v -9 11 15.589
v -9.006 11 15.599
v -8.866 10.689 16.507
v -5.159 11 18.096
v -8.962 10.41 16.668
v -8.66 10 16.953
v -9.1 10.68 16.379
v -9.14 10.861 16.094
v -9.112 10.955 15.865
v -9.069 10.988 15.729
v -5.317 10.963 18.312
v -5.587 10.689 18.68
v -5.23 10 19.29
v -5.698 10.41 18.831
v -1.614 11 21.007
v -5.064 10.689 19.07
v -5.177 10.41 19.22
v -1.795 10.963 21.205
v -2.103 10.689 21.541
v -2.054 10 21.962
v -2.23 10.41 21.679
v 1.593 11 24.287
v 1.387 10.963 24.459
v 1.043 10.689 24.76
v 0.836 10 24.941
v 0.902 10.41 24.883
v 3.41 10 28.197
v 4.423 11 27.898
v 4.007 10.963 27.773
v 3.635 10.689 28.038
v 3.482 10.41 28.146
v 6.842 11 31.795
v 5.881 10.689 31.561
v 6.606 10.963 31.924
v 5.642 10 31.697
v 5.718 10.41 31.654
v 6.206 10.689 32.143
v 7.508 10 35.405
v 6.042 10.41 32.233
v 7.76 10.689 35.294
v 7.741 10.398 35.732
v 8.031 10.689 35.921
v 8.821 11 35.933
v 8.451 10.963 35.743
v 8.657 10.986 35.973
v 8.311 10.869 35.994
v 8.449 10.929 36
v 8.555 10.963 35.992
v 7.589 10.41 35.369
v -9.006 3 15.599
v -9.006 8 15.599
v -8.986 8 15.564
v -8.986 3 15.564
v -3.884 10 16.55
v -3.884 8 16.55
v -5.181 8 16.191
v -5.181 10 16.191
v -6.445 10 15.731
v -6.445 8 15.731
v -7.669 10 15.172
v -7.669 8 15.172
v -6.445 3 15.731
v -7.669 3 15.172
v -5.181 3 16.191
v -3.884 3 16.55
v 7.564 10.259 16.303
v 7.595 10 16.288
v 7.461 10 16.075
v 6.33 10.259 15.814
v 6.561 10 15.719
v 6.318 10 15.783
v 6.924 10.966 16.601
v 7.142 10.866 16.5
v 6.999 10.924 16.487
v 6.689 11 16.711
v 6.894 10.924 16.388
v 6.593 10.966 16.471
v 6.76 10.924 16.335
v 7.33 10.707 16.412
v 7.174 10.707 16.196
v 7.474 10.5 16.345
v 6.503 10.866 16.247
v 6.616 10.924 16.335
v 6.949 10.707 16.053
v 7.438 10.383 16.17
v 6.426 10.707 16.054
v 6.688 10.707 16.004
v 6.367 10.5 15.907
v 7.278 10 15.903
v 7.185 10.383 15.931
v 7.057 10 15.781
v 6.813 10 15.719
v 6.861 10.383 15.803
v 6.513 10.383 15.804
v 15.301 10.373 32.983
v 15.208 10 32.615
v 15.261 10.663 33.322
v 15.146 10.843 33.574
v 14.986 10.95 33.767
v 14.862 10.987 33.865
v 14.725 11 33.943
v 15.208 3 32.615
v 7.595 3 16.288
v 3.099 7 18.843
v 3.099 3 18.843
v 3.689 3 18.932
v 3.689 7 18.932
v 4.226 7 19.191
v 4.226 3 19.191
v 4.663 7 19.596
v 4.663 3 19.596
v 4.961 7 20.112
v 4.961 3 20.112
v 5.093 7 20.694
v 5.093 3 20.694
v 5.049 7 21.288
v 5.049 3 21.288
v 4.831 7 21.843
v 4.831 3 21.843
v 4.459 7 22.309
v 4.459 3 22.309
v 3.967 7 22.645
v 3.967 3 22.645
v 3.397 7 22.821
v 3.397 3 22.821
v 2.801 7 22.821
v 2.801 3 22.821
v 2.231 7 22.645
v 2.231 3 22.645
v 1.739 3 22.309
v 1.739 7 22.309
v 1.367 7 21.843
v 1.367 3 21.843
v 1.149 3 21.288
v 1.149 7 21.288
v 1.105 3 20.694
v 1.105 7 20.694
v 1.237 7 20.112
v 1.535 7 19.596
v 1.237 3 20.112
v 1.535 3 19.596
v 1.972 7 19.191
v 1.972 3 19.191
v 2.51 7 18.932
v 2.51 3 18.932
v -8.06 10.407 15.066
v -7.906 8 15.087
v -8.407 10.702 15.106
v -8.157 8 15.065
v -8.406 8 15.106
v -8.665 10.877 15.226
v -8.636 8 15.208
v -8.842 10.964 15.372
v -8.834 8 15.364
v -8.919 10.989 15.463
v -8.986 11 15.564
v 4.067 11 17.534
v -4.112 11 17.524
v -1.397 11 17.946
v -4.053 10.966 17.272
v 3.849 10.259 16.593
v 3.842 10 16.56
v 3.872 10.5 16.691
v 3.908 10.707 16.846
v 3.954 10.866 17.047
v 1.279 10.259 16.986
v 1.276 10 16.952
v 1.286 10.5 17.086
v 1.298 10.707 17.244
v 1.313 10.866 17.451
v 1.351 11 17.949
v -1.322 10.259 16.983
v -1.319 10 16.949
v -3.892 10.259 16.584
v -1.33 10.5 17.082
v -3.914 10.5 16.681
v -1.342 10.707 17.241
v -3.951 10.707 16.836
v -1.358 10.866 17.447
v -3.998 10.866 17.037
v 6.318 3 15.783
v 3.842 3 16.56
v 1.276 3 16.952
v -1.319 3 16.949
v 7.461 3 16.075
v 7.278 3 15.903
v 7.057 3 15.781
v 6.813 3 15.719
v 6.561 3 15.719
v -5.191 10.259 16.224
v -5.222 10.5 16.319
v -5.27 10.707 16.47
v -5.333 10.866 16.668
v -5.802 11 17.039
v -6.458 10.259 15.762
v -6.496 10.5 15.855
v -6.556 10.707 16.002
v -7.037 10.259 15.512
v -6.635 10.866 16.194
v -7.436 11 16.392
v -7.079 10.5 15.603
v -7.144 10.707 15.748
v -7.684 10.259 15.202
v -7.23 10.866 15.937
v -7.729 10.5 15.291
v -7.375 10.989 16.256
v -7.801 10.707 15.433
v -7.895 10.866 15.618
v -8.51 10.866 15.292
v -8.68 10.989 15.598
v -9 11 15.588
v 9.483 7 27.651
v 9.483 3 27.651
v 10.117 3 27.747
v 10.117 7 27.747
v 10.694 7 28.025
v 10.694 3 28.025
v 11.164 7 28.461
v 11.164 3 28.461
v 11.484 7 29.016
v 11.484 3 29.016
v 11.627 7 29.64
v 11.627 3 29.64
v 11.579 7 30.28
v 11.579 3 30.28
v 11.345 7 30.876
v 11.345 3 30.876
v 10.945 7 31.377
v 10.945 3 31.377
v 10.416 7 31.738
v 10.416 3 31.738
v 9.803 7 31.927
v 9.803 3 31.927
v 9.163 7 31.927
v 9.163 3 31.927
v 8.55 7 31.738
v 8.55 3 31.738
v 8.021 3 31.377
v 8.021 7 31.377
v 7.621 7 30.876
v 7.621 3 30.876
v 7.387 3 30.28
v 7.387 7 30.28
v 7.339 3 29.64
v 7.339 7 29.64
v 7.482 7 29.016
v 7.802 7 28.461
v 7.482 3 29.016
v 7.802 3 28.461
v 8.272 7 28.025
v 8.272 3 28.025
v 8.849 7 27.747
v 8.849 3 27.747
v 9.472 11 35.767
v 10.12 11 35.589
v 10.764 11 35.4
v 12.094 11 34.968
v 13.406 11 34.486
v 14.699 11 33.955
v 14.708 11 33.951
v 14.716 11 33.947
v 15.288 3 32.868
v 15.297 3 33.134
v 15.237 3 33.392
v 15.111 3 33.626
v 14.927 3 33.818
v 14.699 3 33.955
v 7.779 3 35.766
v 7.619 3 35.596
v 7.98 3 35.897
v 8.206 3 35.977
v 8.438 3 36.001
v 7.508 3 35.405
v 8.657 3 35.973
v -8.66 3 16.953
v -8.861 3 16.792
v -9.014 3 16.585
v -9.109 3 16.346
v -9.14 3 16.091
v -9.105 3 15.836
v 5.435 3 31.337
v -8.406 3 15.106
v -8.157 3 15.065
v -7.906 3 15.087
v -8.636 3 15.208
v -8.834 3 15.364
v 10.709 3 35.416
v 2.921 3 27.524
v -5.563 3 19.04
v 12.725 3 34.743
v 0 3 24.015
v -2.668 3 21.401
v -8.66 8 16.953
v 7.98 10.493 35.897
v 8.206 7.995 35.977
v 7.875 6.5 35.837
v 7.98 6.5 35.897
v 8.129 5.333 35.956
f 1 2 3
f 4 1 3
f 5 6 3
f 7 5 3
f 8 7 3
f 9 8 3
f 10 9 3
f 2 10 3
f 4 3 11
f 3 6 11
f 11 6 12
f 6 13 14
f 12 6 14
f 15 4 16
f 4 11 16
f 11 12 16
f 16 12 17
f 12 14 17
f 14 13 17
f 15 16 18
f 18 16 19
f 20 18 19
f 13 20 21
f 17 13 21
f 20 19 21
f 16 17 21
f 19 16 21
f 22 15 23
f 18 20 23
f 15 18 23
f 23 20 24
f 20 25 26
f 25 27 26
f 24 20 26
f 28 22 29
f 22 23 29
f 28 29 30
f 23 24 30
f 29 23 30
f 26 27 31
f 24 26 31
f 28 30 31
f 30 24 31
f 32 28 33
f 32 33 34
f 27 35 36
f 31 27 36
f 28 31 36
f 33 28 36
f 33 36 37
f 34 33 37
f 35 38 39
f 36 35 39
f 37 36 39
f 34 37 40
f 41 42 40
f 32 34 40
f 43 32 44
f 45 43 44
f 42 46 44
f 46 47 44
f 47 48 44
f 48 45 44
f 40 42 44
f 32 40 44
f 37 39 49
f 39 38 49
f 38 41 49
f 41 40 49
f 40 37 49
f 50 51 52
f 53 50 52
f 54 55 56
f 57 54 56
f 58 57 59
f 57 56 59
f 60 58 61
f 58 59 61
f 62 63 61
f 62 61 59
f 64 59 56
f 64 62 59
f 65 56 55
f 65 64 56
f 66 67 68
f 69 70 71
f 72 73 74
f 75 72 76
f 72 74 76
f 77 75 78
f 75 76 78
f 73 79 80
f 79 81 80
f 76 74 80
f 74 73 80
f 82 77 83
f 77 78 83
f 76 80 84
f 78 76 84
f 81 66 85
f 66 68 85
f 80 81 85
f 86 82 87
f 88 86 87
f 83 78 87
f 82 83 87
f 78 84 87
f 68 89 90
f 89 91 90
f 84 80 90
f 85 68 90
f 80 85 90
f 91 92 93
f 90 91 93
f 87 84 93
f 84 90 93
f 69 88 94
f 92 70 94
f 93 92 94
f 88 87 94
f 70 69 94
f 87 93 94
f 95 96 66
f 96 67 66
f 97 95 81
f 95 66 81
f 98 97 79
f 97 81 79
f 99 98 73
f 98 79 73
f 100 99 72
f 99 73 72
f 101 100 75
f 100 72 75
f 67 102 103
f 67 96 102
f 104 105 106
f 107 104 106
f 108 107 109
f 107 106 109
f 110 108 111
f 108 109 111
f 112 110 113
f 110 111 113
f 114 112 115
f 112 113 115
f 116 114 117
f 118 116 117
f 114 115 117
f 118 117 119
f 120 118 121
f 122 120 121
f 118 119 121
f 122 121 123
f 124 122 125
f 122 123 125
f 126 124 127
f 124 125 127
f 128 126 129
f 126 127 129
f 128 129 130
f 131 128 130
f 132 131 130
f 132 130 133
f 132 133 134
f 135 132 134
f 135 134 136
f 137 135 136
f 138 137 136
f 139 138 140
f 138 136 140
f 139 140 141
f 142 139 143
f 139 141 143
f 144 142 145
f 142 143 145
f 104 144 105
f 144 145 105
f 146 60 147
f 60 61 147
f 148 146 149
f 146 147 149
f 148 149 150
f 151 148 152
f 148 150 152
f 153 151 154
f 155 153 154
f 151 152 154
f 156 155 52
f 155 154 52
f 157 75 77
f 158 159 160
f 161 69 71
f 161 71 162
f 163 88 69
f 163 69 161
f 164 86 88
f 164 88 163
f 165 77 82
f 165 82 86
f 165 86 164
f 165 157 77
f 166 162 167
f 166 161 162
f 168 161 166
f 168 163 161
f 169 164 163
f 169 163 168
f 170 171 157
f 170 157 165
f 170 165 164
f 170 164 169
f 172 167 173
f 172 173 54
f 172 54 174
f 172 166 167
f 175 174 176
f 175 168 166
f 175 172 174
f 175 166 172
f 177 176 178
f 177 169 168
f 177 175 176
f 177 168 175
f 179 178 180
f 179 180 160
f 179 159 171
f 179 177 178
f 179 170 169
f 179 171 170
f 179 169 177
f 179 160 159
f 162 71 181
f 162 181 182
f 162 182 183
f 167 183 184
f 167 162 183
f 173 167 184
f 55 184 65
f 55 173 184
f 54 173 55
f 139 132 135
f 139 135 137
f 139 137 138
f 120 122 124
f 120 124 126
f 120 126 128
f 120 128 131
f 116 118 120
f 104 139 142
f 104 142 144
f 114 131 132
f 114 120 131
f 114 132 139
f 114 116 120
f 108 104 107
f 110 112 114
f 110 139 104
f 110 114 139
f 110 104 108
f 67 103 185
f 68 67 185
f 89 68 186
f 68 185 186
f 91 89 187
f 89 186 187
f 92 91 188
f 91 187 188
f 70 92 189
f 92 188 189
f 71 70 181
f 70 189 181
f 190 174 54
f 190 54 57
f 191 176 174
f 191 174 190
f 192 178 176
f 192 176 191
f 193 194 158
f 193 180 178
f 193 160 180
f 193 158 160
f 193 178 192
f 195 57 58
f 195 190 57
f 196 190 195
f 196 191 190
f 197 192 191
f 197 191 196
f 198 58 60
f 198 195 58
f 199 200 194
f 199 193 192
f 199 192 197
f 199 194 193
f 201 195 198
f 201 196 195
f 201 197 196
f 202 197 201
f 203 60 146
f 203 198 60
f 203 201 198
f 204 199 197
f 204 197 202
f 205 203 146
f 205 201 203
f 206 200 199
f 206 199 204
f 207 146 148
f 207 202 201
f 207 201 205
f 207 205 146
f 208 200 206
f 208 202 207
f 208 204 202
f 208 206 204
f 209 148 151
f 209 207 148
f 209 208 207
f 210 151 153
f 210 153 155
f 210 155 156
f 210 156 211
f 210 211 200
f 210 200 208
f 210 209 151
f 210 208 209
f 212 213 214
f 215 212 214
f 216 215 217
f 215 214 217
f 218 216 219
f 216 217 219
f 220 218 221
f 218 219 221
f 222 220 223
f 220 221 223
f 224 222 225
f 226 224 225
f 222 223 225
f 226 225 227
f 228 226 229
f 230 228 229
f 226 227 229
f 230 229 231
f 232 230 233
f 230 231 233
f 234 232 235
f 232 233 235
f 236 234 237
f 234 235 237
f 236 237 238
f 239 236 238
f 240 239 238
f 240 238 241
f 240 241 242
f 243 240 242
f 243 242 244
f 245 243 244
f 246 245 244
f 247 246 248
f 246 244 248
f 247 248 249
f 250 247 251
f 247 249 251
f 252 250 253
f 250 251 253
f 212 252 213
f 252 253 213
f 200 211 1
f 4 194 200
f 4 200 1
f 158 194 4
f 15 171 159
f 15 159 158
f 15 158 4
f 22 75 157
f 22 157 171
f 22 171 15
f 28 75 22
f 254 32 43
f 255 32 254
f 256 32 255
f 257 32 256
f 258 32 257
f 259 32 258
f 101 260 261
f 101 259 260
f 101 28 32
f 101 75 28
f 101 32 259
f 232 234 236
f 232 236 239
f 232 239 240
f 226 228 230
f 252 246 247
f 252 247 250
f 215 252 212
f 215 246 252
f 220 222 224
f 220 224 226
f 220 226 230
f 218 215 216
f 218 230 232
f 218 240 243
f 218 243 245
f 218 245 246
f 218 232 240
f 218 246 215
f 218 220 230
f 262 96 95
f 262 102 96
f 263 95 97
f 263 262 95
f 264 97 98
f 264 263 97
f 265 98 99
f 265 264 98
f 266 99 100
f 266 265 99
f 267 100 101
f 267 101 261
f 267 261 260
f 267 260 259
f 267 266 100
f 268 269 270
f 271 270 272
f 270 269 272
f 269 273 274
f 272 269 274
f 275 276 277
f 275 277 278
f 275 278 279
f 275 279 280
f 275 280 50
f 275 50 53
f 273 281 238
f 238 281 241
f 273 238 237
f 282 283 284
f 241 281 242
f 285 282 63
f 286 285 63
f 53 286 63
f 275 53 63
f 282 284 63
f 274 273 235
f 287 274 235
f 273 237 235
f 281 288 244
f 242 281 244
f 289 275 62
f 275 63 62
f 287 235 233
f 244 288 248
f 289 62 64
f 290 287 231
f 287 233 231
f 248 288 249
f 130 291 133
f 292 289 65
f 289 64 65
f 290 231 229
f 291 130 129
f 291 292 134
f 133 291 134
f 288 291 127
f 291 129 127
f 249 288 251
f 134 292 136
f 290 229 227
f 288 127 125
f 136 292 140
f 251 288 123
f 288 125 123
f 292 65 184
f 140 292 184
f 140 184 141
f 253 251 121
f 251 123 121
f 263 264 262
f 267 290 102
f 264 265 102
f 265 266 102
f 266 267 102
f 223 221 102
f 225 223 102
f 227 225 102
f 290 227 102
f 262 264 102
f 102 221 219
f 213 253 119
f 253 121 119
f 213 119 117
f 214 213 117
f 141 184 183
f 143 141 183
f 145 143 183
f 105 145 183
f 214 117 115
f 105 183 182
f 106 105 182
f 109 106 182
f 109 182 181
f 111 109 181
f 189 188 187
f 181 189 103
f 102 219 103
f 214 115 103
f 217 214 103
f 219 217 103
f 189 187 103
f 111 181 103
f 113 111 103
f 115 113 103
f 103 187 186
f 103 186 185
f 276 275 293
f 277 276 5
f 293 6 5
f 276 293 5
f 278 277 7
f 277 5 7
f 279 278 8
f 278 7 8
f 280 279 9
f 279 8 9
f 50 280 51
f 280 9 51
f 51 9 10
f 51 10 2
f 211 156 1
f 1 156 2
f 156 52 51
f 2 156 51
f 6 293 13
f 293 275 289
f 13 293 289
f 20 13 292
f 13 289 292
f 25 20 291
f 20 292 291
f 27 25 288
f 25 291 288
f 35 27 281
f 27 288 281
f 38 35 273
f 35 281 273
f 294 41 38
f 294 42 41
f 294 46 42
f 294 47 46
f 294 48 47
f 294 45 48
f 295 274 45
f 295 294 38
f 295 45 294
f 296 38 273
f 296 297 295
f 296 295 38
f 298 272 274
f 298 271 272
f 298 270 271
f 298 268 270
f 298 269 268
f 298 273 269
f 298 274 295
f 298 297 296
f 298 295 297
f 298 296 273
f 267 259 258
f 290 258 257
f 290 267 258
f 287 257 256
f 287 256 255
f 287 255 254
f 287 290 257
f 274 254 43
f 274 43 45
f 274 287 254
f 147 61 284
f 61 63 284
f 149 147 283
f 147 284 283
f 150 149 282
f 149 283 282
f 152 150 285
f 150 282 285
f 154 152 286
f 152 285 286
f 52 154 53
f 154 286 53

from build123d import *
from build123d.topology import SkipClean

# Parameters (mm, degrees)
SWEEP_2_DEPTH        = 3
SKETCH_15_W          = 3
SKETCH_15_H          = 8
SKETCH_17_W          = 3
SKETCH_17_H          = 8
REVOLVE_1_ANGLE      = 60
SKETCH_20_R          = 26.546275206
EXTRUDE_1_DEPTH      = 3
SKETCH_21_R          = 12.5
CUT_EXTRUDE_1_DEPTH  = 10
CUT_EXTRUDE_2_REACH  = 67.765
SKETCH_22_R          = 17
EXTRUDE_START        = 22
SKETCH_23_R          = 16.5
SKETCH_23_R_2        = 12.5
EXTRUDE_2_DEPTH      = 22
SKETCH_24_R          = 70.041464106
CUT_EXTRUDE_3_DEPTH  = 10
SKETCH_27_R          = 3
EXTRUDE_4_DEPTH      = 5
SKETCH_28_R          = 1.4
CUT_EXTRUDE_4_DEPTH  = 66.76473219
EXTRUDE_5_DEPTH      = 15
EXTRUDE_5_DEPTH_BACK = 3
SKETCH_30_R          = 1.4
EXTRUDE_6_DEPTH      = 3
EXTRUDE_9_DEPTH      = 8
SKETCH_34_R          = 1.5
CUT_EXTRUDE_5_DEPTH  = 13
SKETCH_35_R          = 57
SKETCH_35_R_2        = 37
CUT_EXTRUDE_6_DEPTH  = 69.556546004
FILLET_1_R           = 1
SKETCH_36_R          = 1.5
EXTRUDE_10_DEPTH     = 4
SKETCH_37_R          = 2
SKETCH_37_R_2        = 2.15
CUT_EXTRUDE_7_DEPTH  = 4


# Read off the part's stored shape, not the designer's step: 扫描2
with BuildPart() as part:
    # 扫描2 outline → 扫描2 (new body)
    with BuildSketch(Plane(origin=(0, 0, 0), x_dir=(1, 0, 0), z_dir=(0, 1, 0))):
        with BuildLine():
            ThreePointArc((-20, -34.641016151), (-12.679491924, -41.961524227), (-10, -51.961524227))
            Line((-10, -51.961524227), (11, -51.961524227))
            ThreePointArc((11, -51.961524227), (10.470745096, -45.395034193), (8.896644323, -38.998073283))
            ThreePointArc((8.896644323, -38.998073283), (5.963817028, 39.55291249), (-20, -34.641016151))
        make_face()
        with BuildLine():
            ThreePointArc((0, -24.015147002), (-4.46857992, -19.881209566), (-9.5, -16.454482672))
            ThreePointArc((-9.5, -16.454482672), (4.917561857, 18.352590699), (0, -19))
            Line((0, -19), (0, -24.015147002))
        make_face(mode=Mode.SUBTRACT)
    extrude(amount=SWEEP_2_DEPTH)

    # 扫描3: sweep along a path in 草图16
    with BuildLine(Plane(origin=(0, 3, 0), x_dir=(1, 0, 0), z_dir=(0, 1, 0))) as sweep_3_path:
        ThreePointArc((-10, -51.961524227), (-12.679491924, -41.961524227), (-20, -34.641016151))
        ThreePointArc((-20, -34.641016151), (5.963817027, 39.55291249), (8.896644323, -38.998073283))
    # 草图15 → 扫描3 (sweep)
    with BuildSketch(Plane.XY.offset(51.961524227)):
        with Locations((-8.5, 4)):
            Rectangle(SKETCH_15_W, SKETCH_15_H)
    sweep(path=sweep_3_path.line)

    # 草图17 → 旋转1 (revolve)
    with BuildSketch(Plane.XY.offset(51.961524227)):
        with Locations((12.5, 4)):
            Rectangle(SKETCH_17_W, SKETCH_17_H)
    revolve(axis=Axis((-30, 3, 51.961524227), (0, 1, 0)), revolution_arc=REVOLVE_1_ANGLE)

    # 草图20 → 凸台-拉伸1 (add)
    with BuildSketch(Plane(origin=(0, 3, 0), x_dir=(1, 0, 0), z_dir=(0, 1, 0))):
        Circle(SKETCH_20_R)
    extrude(amount=-EXTRUDE_1_DEPTH)

    # 草图21 → 切除-拉伸1 (cut)
    with BuildSketch(Plane(origin=(0, 3, 0), x_dir=(1, 0, 0), z_dir=(0, 1, 0))):
        with Locations(Location((0, 0, 0), (0, 0, 270))):
            Circle(SKETCH_21_R)
    extrude(amount=-CUT_EXTRUDE_1_DEPTH, mode=Mode.SUBTRACT)

    # 草图22 → 切除-拉伸2 (cut, up to next)
    with BuildSketch(Plane(origin=(0, 3, 0), x_dir=(1, 0, 0), z_dir=(0, 1, 0)), mode=Mode.PRIVATE) as cut_extrude_2_sk1:
        Circle(SKETCH_22_R)
    cut_extrude_2_tool1 = extrude(cut_extrude_2_sk1.sketch, amount=CUT_EXTRUDE_2_REACH, mode=Mode.PRIVATE) & part.part
    add(cut_extrude_2_tool1.solids().sort_by_distance((0, 3, 0))[0], mode=Mode.SUBTRACT)

    # 草图23 → 凸台-拉伸2 (add)
    with BuildSketch(Plane(origin=(0, 3, 0), x_dir=(1, 0, 0), z_dir=(0, 1, 0)).offset(EXTRUDE_START)):
        with Locations(Location((0, 0, 0), (0, 0, 270))):
            Circle(SKETCH_23_R)
        with Locations(Location((0, 0, 0), (0, 0, 270))):
            Circle(SKETCH_23_R_2, mode=Mode.SUBTRACT)
    extrude(amount=-EXTRUDE_2_DEPTH)

    # 草图24 → 切除-拉伸3 (cut)
    with BuildSketch(Plane(origin=(0, 3, 0), x_dir=(1, 0, 0), z_dir=(0, 1, 0))):
        Circle(SKETCH_24_R)
    extrude(amount=-CUT_EXTRUDE_3_DEPTH, mode=Mode.SUBTRACT)


with BuildPart() as cut_extrude_3_kept_piece:
    # of the separate pieces the step leaves, the one the design keeps (cut_extrude_3_pieces_kept)
    add(part.part.solids().sort_by_distance((-20, 8, 34.641016151))[0])

    # 草图27 → 凸台-拉伸4 (add)
    with BuildSketch(Plane(origin=(0, 8, 0), x_dir=(1, 0, 0), z_dir=(0, 1, 0))):
        with Locations((0, 40)):
            Circle(SKETCH_27_R)
        with Locations((34.641016151, 20)):
            Circle(SKETCH_27_R)
        with Locations((34.641016151, -20)):
            Circle(SKETCH_27_R)
        with Locations((-34.641016151, -20)):
            Circle(SKETCH_27_R)
        with Locations((-34.641016151, 20)):
            Circle(SKETCH_27_R)
    extrude(amount=-EXTRUDE_4_DEPTH)

    # 草图28 → 切除-拉伸4 (cut, through all)
    with BuildSketch(Plane(origin=(0, 8, 0), x_dir=(1, 0, 0), z_dir=(0, 1, 0))):
        with Locations(Location((0, 40, 0), (0, 0, 270))):
            Circle(SKETCH_28_R)
        with Locations(Location((34.641016151, 20, 0), (0, 0, 270))):
            Circle(SKETCH_28_R)
        with Locations(Location((34.641016151, -20, 0), (0, 0, 270))):
            Circle(SKETCH_28_R)
        with Locations((0, -40)):
            Circle(SKETCH_28_R)
        with Locations(Location((-34.641016151, -20, 0), (0, 0, 270))):
            Circle(SKETCH_28_R)
        with Locations(Location((-34.641016151, 20, 0), (0, 0, 270))):
            Circle(SKETCH_28_R)
    extrude(amount=-CUT_EXTRUDE_4_DEPTH, mode=Mode.SUBTRACT)

    # 草图30 → 凸台-拉伸5 (add, two sides: drawn at the far end of the back side and taken through both)
    # profile 1 of 2: a face of its own
    with BuildSketch(Plane(origin=(0, 8, 0), x_dir=(1, 0, 0), z_dir=(0, 1, 0)).offset(-EXTRUDE_5_DEPTH_BACK)):
        with BuildLine():
            ThreePointArc((-18.5, -32.04293994), (4.216428718, 36.758968006), (10.764012371, -35.399661547))
            Line((10.764012371, -35.399661547), (7.984647891, -36.528879457))
            ThreePointArc((7.984647891, -36.528879457), (10.239101404, -44.09929056), (11, -51.961524227))
            Line((11, -51.961524227), (14, -51.961524227))
            ThreePointArc((14, -51.961524227), (13.446319486, -45.003268476), (11.799212586, -38.220133207))
            ThreePointArc((11.799212586, -38.220133207), (23.753094696, -32.183699172), (33.044643352, -22.539998796))
            ThreePointArc((33.044643352, -22.539998796), (37.239092363, -21.5), (36.042533235, -17.347501204))
            ThreePointArc((36.042533235, -17.347501204), (40, 0), (36.042533235, 17.347501204))
            ThreePointArc((36.042533235, 17.347501204), (37.239092363, 21.5), (33.044643352, 22.539998796))
            ThreePointArc((33.044643352, 22.539998796), (20, 34.641016151), (2.997889883, 39.8875))
            ThreePointArc((2.997889883, 39.8875), (0, 43), (-2.997889883, 39.8875))
            ThreePointArc((-2.997889883, 39.8875), (-20, 34.641016151), (-33.044643352, 22.539998796))
            ThreePointArc((-33.044643352, 22.539998796), (-37.239092363, 21.5), (-36.042533235, 17.347501204))
            ThreePointArc((-36.042533235, 17.347501204), (-40, 0), (-36.042533235, -17.347501204))
            ThreePointArc((-36.042533235, -17.347501204), (-37.239092363, -21.5), (-33.044643352, -22.539998796))
            ThreePointArc((-33.044643352, -22.539998796), (-27.203716701, -29.325037044), (-20, -34.641016151))
            Line((-20, -34.641016151), (-18.5, -32.04293994))
        make_face()
        with Locations(Location((-34.641016151, -20, 0), (0, 0, 270))):
            Circle(SKETCH_30_R, mode=Mode.SUBTRACT)
        with Locations(Location((34.641016151, -20, 0), (0, 0, 270))):
            Circle(SKETCH_30_R, mode=Mode.SUBTRACT)
        with Locations(Location((-34.641016151, 20, 0), (0, 0, 270))):
            Circle(SKETCH_30_R, mode=Mode.SUBTRACT)
        with Locations(Location((0, 40, 0), (0, 0, 270))):
            Circle(SKETCH_30_R, mode=Mode.SUBTRACT)
        with Locations(Location((34.641016151, 20, 0), (0, 0, 270))):
            Circle(SKETCH_30_R, mode=Mode.SUBTRACT)
    # profile 2 of 2: a face of its own
    with BuildSketch(Plane(origin=(0, 8, 0), x_dir=(1, 0, 0), z_dir=(0, 1, 0)).offset(-EXTRUDE_5_DEPTH_BACK)):
        with BuildLine():
            Line((-20, -34.641016151), (-18.5, -32.04293994))
            ThreePointArc((-18.5, -32.04293994), (-10.081415713, -40.461524227), (-7, -51.961524227))
            Line((-7, -51.961524227), (-10, -51.961524227))
            ThreePointArc((-10, -51.961524227), (-12.679491924, -41.961524227), (-20, -34.641016151))
        make_face()
    extrude(amount=EXTRUDE_5_DEPTH + EXTRUDE_5_DEPTH_BACK)

    # 草图31 → 凸台-拉伸6 (add)
    with BuildSketch(Plane(origin=(0, 8, 0), x_dir=(1, 0, 0), z_dir=(0, 1, 0))):
        with BuildLine():
            Line((7.984647891, -36.528879457), (10.764012371, -35.399661547))
            ThreePointArc((10.764012371, -35.399661547), (4.742794362, -24.962667956), (-3.883880218, -16.550391973))
            ThreePointArc((-3.883880218, -16.550391973), (-6.259032022, -15.805838103), (-8.5, -14.722431864))
            Line((-8.5, -14.722431864), (-9.5, -16.454482672))
            ThreePointArc((-9.5, -16.454482672), (0.916967208, -25.033079439), (7.984647891, -36.528879457))
        make_face()
    extrude(amount=EXTRUDE_6_DEPTH)

    # 草图33 → 凸台-拉伸9 (add)
    with BuildSketch(Plane(origin=(0, 11, 0), x_dir=(1, 0, 0), z_dir=(0, 1, 0))):
        with BuildLine():
            Line((15.636875684, -33.53338812), (7.18451045, -15.40723238))
            ThreePointArc((7.18451045, -15.40723238), (1.746494616, -16.910048981), (-3.883880218, -16.550391973))
            ThreePointArc((-3.883880218, -16.550391973), (4.742794362, -24.962667956), (10.764012371, -35.399661547))
            ThreePointArc((10.764012371, -35.399661547), (13.23338455, -34.552532951), (15.636875684, -33.53338812))
        make_face()
    extrude(amount=-EXTRUDE_9_DEPTH)

    # 草图34 → 切除-拉伸5 (cut)
    with BuildSketch(Plane(origin=(0, 11, 0), x_dir=(1, 0, 0), z_dir=(0, 1, 0))):
        with Locations(Location((3.099042165, -20.843126869, 0), (0, 0, 270))):
            Circle(SKETCH_34_R)
        with Locations(Location((9.482973177, -29.801107938, 0), (0, 0, 270))):
            Circle(SKETCH_34_R)
    extrude(amount=-CUT_EXTRUDE_5_DEPTH, mode=Mode.SUBTRACT)

    # 草图35 → 切除-拉伸6 (cut, through all)
    with SkipClean():  # the faces are left unmerged after this step: merging them gives an invalid solid
        with BuildSketch(Plane.XZ.offset(-3)):
            Circle(SKETCH_35_R)
            Circle(SKETCH_35_R_2, mode=Mode.SUBTRACT)
        extrude(amount=-CUT_EXTRUDE_6_DEPTH, mode=Mode.SUBTRACT)

    # 圆角1
    fillet_1_edges = [cut_extrude_3_kept_piece.edges().sort_by_distance(p)[0] for p in [
        (15.636875684, 7, 33.53338812),
        (7.833230134, 7, 36.161312278),
        (7.18451045, 7, 15.40723238),
        (11.410693067, 11, 24.47031025),
        (0.786055573, 11, 24.883511334),
        (-9.5, 5.5, 16.454482672),
        (-8.5, 5.5, 14.722431864),
        (1.746494616, 11, 16.910048981),
    ]]
    fillet(fillet_1_edges, radius=FILLET_1_R - 0.0001)  # a hair under: the kernel refuses the full size

    # 草图36 → 凸台-拉伸10 (add)
    with BuildSketch(Plane(origin=(0, 11, 0), x_dir=(1, 0, 0), z_dir=(0, 1, 0))):
        with Locations(Location((9.482973177, -29.801107938, 0), (0, 0, 270))):
            Circle(SKETCH_36_R)
        with Locations(Location((3.099042165, -20.843126869, 0), (0, 0, 270))):
            Circle(SKETCH_36_R)
    extrude(amount=-EXTRUDE_10_DEPTH)

    # 草图37 → 切除-拉伸7 (cut)
    with BuildSketch(Plane.XZ.offset(-3)):
        with Locations(Location((3.099042165, 20.843126869, 0), (0, 0, 270))):
            Circle(SKETCH_37_R)
        with Locations(Location((9.482973177, 29.801107938, 0), (0, 0, 270))):
            Circle(SKETCH_37_R_2)
    extrude(amount=-CUT_EXTRUDE_7_DEPTH, mode=Mode.SUBTRACT)


solid = cut_extrude_3_kept_piece.part
